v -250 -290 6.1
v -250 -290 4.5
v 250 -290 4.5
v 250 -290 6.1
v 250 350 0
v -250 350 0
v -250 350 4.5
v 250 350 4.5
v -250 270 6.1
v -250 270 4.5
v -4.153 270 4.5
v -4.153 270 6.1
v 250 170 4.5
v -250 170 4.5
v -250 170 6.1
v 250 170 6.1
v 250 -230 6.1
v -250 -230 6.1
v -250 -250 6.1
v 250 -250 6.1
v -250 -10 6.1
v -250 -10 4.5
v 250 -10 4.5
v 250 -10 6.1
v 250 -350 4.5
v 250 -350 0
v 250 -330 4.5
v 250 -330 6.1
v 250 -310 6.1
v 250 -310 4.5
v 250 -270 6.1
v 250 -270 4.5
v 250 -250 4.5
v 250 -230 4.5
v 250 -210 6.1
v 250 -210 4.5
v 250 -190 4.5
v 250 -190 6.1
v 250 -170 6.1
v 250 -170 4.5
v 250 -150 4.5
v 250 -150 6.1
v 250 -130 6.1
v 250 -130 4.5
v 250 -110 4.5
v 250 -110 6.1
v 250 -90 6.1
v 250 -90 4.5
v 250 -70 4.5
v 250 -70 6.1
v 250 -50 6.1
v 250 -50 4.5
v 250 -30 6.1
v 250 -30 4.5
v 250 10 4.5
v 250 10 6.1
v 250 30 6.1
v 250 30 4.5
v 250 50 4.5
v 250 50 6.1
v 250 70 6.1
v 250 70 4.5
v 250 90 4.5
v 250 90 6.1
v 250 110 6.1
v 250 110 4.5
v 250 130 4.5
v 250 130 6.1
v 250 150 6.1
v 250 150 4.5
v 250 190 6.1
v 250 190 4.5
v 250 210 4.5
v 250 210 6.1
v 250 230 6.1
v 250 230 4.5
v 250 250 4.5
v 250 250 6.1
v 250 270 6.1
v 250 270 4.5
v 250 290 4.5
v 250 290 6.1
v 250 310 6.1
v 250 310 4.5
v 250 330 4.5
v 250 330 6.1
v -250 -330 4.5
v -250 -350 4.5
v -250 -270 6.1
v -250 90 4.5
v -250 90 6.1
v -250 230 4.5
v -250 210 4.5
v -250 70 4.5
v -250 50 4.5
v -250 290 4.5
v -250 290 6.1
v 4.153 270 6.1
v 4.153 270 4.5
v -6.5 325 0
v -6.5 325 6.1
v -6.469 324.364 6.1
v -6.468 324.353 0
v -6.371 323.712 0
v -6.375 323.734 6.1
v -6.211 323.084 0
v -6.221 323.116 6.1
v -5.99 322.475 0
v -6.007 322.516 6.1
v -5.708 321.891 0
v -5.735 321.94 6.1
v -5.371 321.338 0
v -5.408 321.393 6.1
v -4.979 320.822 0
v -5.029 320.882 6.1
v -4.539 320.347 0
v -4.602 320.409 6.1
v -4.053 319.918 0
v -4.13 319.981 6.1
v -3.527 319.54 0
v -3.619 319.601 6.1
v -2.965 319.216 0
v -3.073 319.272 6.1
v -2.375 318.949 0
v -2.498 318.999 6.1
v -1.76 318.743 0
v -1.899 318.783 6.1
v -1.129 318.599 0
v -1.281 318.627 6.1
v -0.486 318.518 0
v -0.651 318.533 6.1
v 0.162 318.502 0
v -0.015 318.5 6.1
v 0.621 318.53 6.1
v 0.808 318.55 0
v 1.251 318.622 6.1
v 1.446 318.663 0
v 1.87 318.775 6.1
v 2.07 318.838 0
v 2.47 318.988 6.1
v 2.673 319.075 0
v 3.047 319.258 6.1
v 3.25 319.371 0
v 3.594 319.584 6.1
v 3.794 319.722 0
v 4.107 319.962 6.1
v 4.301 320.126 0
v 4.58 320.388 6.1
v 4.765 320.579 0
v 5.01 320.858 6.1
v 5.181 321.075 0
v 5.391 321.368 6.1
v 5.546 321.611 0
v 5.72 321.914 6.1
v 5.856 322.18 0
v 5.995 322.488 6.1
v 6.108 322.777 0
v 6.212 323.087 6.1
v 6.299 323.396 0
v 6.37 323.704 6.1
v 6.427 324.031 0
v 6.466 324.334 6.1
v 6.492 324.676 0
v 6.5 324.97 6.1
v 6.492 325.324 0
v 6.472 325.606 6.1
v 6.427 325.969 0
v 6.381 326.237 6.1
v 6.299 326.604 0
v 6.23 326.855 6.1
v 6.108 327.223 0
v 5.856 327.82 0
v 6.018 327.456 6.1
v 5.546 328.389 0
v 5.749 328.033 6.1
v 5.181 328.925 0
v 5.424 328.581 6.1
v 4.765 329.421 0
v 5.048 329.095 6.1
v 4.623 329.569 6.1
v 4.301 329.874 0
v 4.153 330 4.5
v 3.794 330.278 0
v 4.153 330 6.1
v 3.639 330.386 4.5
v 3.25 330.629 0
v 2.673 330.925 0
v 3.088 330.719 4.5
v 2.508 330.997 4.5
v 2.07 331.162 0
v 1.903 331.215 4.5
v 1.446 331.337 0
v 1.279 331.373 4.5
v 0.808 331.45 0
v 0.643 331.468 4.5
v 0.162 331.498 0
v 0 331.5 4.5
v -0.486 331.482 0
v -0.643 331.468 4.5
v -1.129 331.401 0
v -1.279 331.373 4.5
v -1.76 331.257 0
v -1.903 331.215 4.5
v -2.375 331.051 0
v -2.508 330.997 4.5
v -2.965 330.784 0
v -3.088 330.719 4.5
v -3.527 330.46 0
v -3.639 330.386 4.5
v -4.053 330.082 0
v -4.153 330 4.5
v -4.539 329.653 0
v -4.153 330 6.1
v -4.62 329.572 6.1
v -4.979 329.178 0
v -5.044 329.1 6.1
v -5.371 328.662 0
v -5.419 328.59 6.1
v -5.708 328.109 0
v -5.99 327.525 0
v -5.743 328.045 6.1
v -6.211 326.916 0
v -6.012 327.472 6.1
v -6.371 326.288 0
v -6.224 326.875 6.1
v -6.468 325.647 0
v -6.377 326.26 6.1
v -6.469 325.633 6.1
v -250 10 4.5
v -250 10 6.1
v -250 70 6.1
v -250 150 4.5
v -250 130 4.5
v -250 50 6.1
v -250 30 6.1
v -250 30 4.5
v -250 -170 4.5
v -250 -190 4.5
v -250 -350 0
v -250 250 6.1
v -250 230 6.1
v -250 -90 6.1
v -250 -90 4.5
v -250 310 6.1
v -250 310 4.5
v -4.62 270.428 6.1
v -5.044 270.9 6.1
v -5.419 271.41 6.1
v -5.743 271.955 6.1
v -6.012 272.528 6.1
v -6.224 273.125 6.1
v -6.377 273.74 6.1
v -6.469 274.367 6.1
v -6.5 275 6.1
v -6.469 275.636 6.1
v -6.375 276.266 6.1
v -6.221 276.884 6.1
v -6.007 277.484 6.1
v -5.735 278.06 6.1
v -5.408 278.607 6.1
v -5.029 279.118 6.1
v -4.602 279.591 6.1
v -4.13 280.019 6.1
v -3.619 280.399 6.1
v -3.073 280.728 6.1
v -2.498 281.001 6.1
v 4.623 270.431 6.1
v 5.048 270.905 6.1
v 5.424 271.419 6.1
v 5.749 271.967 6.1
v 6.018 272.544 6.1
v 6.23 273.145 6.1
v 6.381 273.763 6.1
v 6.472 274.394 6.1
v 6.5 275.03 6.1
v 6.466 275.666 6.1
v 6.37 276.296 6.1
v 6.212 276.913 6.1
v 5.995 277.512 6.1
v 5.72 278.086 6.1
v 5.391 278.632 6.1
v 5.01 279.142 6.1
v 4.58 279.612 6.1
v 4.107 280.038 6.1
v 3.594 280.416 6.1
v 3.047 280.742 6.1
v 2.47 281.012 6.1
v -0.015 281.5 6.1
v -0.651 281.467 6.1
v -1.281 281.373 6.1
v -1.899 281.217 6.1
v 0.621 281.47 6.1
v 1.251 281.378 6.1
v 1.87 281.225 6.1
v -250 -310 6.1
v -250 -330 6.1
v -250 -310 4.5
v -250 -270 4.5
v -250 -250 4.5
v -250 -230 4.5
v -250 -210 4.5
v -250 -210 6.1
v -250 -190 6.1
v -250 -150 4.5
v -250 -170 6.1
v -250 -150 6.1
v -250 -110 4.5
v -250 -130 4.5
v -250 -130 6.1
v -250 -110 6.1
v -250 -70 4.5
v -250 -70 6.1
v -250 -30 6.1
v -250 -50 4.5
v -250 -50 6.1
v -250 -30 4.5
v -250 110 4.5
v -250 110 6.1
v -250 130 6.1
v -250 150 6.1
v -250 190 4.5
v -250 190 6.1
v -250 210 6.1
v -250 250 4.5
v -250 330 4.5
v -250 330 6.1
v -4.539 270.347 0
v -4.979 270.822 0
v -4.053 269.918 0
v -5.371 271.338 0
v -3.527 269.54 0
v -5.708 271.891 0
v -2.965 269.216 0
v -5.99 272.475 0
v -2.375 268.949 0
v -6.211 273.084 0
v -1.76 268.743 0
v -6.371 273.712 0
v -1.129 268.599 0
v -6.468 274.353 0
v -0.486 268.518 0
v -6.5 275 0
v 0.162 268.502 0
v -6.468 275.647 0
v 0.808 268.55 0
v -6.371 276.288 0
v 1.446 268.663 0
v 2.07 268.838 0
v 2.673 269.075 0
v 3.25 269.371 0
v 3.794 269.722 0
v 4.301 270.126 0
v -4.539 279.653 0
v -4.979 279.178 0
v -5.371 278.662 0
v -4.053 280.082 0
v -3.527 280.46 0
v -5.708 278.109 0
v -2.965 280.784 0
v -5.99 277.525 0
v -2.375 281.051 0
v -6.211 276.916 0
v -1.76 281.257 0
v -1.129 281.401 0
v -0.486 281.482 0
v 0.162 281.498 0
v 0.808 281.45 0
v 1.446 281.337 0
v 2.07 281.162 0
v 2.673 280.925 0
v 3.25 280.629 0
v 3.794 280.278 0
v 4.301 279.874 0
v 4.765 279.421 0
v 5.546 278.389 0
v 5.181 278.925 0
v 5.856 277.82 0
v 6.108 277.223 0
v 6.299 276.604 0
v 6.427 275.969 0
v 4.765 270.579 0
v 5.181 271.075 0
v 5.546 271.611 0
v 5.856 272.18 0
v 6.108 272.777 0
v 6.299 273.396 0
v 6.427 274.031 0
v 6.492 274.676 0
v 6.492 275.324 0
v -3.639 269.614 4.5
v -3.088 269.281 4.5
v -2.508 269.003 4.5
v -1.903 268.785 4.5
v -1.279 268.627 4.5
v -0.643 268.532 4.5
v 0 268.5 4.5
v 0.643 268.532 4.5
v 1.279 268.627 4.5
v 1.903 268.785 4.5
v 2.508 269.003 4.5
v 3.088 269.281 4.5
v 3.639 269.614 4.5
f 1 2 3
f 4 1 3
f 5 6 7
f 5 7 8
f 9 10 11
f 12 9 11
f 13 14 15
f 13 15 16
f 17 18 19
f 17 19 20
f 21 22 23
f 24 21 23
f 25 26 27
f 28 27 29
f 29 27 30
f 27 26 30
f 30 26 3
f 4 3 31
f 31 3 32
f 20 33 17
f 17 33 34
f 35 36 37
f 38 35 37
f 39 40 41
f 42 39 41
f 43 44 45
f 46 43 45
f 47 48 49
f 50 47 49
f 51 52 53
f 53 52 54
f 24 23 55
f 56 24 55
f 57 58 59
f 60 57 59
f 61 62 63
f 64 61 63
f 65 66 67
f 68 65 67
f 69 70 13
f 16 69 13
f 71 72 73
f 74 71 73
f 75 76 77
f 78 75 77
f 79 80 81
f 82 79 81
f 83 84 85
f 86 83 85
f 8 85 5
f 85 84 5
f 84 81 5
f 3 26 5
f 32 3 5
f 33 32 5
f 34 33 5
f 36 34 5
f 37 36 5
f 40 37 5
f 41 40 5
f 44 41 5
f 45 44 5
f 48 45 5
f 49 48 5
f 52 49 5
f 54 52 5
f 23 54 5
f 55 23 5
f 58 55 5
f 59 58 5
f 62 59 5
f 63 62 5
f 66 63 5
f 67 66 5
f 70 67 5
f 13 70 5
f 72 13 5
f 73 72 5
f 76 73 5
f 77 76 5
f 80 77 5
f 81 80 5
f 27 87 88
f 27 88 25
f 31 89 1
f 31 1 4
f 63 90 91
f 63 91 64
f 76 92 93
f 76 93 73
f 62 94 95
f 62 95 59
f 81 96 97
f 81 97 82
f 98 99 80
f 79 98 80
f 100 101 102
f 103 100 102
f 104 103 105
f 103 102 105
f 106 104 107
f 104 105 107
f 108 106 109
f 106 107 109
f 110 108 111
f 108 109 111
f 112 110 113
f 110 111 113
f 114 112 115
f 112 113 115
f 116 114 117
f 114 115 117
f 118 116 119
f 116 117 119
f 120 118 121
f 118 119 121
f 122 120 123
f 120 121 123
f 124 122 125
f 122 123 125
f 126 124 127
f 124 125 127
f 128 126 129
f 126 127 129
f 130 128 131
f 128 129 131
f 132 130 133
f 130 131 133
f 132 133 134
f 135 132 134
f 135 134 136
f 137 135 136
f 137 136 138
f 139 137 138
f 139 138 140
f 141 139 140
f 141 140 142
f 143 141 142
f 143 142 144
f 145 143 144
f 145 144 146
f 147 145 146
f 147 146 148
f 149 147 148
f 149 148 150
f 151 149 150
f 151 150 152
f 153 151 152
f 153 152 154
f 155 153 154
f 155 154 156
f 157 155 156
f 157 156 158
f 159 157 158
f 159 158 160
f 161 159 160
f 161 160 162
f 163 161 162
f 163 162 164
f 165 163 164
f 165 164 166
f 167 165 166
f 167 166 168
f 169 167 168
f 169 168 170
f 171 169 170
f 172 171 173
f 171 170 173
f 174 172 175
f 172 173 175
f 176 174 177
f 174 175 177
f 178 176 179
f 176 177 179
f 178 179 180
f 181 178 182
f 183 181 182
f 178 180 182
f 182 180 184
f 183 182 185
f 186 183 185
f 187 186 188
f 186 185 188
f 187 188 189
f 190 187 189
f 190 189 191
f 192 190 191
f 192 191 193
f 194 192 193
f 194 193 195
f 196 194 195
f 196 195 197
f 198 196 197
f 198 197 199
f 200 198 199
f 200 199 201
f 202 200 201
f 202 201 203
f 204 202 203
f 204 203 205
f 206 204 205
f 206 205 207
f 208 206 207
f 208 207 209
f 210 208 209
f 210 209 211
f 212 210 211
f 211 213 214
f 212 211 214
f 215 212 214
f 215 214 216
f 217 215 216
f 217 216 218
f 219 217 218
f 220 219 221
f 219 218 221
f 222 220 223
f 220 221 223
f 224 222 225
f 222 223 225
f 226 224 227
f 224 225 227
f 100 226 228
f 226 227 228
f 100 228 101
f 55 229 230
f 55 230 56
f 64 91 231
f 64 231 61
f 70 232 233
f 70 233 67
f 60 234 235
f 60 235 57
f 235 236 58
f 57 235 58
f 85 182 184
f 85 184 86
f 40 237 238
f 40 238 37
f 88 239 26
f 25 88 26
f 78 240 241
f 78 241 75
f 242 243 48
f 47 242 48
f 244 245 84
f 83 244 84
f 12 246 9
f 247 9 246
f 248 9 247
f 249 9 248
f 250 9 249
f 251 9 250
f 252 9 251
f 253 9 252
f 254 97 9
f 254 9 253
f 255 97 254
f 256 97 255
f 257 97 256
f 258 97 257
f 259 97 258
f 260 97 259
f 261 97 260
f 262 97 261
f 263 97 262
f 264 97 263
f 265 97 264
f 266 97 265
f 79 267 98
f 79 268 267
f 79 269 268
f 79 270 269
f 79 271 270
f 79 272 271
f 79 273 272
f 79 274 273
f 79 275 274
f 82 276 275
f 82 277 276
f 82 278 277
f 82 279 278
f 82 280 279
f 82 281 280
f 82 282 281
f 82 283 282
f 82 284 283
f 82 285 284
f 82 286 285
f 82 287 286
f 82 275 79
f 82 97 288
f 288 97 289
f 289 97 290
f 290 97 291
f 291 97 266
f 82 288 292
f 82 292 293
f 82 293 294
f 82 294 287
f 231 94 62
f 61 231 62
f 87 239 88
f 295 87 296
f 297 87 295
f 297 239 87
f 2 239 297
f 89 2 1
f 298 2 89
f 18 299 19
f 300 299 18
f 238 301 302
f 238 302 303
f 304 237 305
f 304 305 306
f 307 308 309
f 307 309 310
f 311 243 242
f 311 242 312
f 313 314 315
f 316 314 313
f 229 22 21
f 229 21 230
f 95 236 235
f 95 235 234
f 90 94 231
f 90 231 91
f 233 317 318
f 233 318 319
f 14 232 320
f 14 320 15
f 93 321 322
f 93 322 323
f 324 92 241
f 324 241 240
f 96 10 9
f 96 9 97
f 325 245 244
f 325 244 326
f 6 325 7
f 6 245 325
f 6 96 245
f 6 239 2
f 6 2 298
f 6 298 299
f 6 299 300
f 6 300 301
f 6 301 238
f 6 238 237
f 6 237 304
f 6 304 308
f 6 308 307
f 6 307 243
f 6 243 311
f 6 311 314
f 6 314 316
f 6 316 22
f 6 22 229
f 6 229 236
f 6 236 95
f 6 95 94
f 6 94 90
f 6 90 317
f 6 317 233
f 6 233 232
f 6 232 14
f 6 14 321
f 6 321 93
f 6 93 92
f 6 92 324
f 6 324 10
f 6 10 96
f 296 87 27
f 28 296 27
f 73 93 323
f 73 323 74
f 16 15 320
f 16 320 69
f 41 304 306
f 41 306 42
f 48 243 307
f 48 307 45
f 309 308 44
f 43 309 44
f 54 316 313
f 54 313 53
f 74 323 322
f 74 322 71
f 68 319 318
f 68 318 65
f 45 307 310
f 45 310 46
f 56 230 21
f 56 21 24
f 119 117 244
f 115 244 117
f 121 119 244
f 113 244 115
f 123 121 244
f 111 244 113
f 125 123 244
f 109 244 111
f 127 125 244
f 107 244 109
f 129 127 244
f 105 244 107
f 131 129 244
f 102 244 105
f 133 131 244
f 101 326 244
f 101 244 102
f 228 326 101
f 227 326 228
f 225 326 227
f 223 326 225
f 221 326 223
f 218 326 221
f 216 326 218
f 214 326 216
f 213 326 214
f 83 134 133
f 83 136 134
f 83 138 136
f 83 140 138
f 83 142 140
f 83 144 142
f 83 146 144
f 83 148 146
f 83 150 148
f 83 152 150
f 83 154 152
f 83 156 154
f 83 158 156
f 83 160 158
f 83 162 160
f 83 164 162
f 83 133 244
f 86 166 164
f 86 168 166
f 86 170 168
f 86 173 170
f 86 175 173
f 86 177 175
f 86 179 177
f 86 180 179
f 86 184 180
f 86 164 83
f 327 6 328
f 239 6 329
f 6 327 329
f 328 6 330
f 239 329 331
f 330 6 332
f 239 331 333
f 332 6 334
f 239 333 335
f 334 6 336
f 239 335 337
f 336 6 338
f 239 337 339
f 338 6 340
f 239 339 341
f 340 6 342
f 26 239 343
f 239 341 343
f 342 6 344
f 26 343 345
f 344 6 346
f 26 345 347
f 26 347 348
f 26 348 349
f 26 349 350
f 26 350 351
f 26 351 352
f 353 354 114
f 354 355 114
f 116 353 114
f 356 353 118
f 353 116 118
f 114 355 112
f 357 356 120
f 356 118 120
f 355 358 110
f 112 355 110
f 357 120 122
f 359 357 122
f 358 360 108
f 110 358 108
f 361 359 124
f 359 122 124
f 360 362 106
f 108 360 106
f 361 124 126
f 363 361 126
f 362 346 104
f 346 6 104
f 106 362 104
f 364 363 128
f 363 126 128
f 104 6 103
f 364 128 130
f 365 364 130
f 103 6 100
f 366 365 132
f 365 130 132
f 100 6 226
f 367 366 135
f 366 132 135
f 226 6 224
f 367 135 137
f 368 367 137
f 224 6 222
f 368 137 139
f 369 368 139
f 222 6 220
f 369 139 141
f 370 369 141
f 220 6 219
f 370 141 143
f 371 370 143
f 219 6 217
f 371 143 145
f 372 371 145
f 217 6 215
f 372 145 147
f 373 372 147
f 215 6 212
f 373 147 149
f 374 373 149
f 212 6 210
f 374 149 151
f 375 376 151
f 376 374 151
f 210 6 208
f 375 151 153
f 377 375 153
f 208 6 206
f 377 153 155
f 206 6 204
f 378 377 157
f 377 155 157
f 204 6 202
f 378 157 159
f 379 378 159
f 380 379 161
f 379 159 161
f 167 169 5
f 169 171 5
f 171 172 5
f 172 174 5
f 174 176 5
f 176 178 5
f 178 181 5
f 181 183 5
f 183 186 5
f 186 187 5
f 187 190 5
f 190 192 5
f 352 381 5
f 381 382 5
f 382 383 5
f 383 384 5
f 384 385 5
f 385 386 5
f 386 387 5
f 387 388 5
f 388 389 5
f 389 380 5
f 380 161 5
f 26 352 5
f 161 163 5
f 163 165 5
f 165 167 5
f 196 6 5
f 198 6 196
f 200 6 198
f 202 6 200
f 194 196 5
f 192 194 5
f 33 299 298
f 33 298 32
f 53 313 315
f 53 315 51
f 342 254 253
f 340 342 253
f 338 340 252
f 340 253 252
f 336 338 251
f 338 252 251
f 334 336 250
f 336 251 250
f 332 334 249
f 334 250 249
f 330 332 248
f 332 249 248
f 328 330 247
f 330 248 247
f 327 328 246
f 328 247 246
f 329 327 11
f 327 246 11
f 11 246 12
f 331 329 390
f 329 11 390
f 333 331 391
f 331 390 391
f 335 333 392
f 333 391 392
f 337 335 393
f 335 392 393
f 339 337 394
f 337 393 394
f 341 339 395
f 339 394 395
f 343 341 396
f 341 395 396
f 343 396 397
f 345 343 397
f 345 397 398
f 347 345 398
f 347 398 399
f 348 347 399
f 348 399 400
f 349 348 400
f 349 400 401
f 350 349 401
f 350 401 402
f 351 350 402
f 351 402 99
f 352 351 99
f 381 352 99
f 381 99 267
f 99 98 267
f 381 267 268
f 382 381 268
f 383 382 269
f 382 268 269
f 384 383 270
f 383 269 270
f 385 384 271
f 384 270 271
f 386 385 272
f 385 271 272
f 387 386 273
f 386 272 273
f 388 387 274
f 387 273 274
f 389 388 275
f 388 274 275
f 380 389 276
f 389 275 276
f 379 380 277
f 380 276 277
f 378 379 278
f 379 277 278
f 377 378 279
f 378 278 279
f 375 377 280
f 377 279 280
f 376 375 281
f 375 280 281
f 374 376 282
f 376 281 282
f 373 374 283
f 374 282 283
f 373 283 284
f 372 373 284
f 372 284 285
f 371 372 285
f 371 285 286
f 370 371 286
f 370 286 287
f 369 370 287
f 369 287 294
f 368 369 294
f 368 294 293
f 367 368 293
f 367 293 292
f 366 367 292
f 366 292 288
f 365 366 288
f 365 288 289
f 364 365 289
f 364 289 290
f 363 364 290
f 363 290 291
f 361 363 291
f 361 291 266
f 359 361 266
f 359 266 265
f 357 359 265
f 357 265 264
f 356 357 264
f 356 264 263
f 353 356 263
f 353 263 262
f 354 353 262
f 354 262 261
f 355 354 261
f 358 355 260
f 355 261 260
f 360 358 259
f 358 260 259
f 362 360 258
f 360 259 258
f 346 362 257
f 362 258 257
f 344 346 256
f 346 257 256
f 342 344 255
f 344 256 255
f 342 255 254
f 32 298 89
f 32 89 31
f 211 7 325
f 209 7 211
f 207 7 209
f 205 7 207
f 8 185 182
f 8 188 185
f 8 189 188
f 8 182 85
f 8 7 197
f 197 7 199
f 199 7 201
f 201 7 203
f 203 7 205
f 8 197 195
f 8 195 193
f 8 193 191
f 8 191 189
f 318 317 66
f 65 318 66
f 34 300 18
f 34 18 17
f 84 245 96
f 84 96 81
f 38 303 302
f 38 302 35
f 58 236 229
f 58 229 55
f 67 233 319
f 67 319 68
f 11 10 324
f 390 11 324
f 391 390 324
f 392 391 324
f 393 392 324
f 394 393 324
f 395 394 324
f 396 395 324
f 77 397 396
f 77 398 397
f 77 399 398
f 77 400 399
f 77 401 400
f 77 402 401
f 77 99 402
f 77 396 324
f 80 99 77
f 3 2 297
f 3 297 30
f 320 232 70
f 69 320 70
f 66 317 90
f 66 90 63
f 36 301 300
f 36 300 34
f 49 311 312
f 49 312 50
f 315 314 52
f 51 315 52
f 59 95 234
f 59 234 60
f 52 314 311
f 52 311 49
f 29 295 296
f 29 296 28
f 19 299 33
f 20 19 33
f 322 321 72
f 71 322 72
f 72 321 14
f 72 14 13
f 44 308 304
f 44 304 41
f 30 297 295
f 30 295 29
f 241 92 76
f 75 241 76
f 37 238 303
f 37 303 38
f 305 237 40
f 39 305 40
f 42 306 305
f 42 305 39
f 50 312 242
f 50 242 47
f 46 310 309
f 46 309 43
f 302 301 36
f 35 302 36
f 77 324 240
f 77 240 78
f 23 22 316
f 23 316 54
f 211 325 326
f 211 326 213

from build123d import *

# Parameters (mm, degrees)
F0_W     = 500
F0_H     = 20
F1_DEPTH = 4.5
F2_DEPTH = 6.1
F3_D     = 13


with BuildPart() as f1:
    # F0 (on Top) → F1 (new body)
    with BuildSketch(Plane.XY):
        with Locations((0, 340)):
            Rectangle(F0_W, F0_H)
    extrude(amount=F1_DEPTH)



with BuildPart() as f1b:
    # F0 (on Top) → F1, piece 2 (new body)
    with BuildSketch(Plane.XY):
        with Locations((0, 300)):
            Rectangle(F0_W, F0_H)
    extrude(amount=F1_DEPTH)


with BuildPart() as f1c:
    # F0 (on Top) → F1, piece 3 (new body)
    with BuildSketch(Plane.XY):
        with Locations((0, 260)):
            Rectangle(F0_W, F0_H)
    extrude(amount=F1_DEPTH)


with BuildPart() as f1d:
    # F0 (on Top) → F1, piece 4 (new body)
    with BuildSketch(Plane.XY):
        with Locations((0, 220)):
            Rectangle(F0_W, F0_H)
    extrude(amount=F1_DEPTH)


with BuildPart() as f1e:
    # F0 (on Top) → F1, piece 5 (new body)
    with BuildSketch(Plane.XY):
        with Locations((0, 180)):
            Rectangle(F0_W, F0_H)
    extrude(amount=F1_DEPTH)


with BuildPart() as f1f:
    # F0 (on Top) → F1, piece 6 (new body)
    with BuildSketch(Plane.XY):
        with Locations((0, 140)):
            Rectangle(F0_W, F0_H)
    extrude(amount=F1_DEPTH)


with BuildPart() as f1g:
    # F0 (on Top) → F1, piece 7 (new body)
    with BuildSketch(Plane.XY):
        with Locations((0, 100)):
            Rectangle(F0_W, F0_H)
    extrude(amount=F1_DEPTH)


with BuildPart() as f1h:
    # F0 (on Top) → F1, piece 8 (new body)
    with BuildSketch(Plane.XY):
        with Locations((0, 60)):
            Rectangle(F0_W, F0_H)
    extrude(amount=F1_DEPTH)


with BuildPart() as f1i:
    # F0 (on Top) → F1, piece 9 (new body)
    with BuildSketch(Plane.XY):
        with Locations((0, 20)):
            Rectangle(F0_W, F0_H)
    extrude(amount=F1_DEPTH)


with BuildPart() as f1j:
    # F0 (on Top) → F1, piece 10 (new body)
    with BuildSketch(Plane.XY):
        with Locations((0, -20)):
            Rectangle(F0_W, F0_H)
    extrude(amount=F1_DEPTH)


with BuildPart() as f1k:
    # F0 (on Top) → F1, piece 11 (new body)
    with BuildSketch(Plane.XY):
        with Locations((0, -60)):
            Rectangle(F0_W, F0_H)
    extrude(amount=F1_DEPTH)


with BuildPart() as f1l:
    # F0 (on Top) → F1, piece 12 (new body)
    with BuildSketch(Plane.XY):
        with Locations((0, -100)):
            Rectangle(F0_W, F0_H)
    extrude(amount=F1_DEPTH)


with BuildPart() as f1m:
    # F0 (on Top) → F1, piece 13 (new body)
    with BuildSketch(Plane.XY):
        with Locations((0, -140)):
            Rectangle(F0_W, F0_H)
    extrude(amount=F1_DEPTH)


with BuildPart() as f1n:
    # F0 (on Top) → F1, piece 14 (new body)
    with BuildSketch(Plane.XY):
        with Locations((0, -180)):
            Rectangle(F0_W, F0_H)
    extrude(amount=F1_DEPTH)


with BuildPart() as f1o:
    # F0 (on Top) → F1, piece 15 (new body)
    with BuildSketch(Plane.XY):
        with Locations((0, -220)):
            Rectangle(F0_W, F0_H)
    extrude(amount=F1_DEPTH)


with BuildPart() as f1p:
    # F0 (on Top) → F1, piece 16 (new body)
    with BuildSketch(Plane.XY):
        with Locations((0, -260)):
            Rectangle(F0_W, F0_H)
    extrude(amount=F1_DEPTH)


with BuildPart() as f1q:
    # F0 (on Top) → F1, piece 17 (new body)
    with BuildSketch(Plane.XY):
        with Locations((0, -300)):
            Rectangle(F0_W, F0_H)
    extrude(amount=F1_DEPTH)


with BuildPart() as f1r:
    # F0 (on Top) → F1, piece 18 (new body)
    with BuildSketch(Plane.XY):
        with Locations((0, -340)):
            Rectangle(F0_W, F0_H)
    extrude(amount=F1_DEPTH)


with BuildPart() as f1_1:
    add(f1.part)

    add(f1b.part)  # F2 merges F1b

    add(f1c.part)  # F2 merges F1c

    add(f1d.part)  # F2 merges F1d

    add(f1e.part)  # F2 merges F1e

    add(f1f.part)  # F2 merges F1f

    add(f1g.part)  # F2 merges F1g

    add(f1h.part)  # F2 merges F1h

    add(f1i.part)  # F2 merges F1i

    add(f1j.part)  # F2 merges F1j

    add(f1k.part)  # F2 merges F1k

    add(f1l.part)  # F2 merges F1l

    add(f1m.part)  # F2 merges F1m

    add(f1n.part)  # F2 merges F1n

    add(f1o.part)  # F2 merges F1o

    add(f1p.part)  # F2 merges F1p

    add(f1q.part)  # F2 merges F1q

    add(f1r.part)  # F2 merges F1r
    # F0 (on Top) → F2 (join)
    with BuildSketch(Plane.XY):
        with Locations((0, 320)):
            Rectangle(F0_W, F0_H)
        with Locations((0, 280)):
            Rectangle(F0_W, F0_H)
        with Locations((0, 240)):
            Rectangle(F0_W, F0_H)
        with Locations((0, 200)):
            Rectangle(F0_W, F0_H)
        with Locations((0, 160)):
            Rectangle(F0_W, F0_H)
        with Locations((0, 120)):
            Rectangle(F0_W, F0_H)
        with Locations((0, 80)):
            Rectangle(F0_W, F0_H)
        with Locations((0, 40)):
            Rectangle(F0_W, F0_H)
        Rectangle(F0_W, F0_H)
        with Locations((0, -40)):
            Rectangle(F0_W, F0_H)
        with Locations((0, -80)):
            Rectangle(F0_W, F0_H)
        with Locations((0, -120)):
            Rectangle(F0_W, F0_H)
        with Locations((0, -160)):
            Rectangle(F0_W, F0_H)
        with Locations((0, -200)):
            Rectangle(F0_W, F0_H)
        with Locations((0, -240)):
            Rectangle(F0_W, F0_H)
        with Locations((0, -280)):
            Rectangle(F0_W, F0_H)
        with Locations((0, -320)):
            Rectangle(F0_W, F0_H)
    extrude(amount=F2_DEPTH)

    # F3 (through all)
    with Locations(Plane(origin=(0, 0, 0), x_dir=(1, 0, 0), z_dir=(0, 0, -1))):
        with Locations((0, -325), (0, -275)):
            Hole(F3_D / 2)


solid = f1_1.part
